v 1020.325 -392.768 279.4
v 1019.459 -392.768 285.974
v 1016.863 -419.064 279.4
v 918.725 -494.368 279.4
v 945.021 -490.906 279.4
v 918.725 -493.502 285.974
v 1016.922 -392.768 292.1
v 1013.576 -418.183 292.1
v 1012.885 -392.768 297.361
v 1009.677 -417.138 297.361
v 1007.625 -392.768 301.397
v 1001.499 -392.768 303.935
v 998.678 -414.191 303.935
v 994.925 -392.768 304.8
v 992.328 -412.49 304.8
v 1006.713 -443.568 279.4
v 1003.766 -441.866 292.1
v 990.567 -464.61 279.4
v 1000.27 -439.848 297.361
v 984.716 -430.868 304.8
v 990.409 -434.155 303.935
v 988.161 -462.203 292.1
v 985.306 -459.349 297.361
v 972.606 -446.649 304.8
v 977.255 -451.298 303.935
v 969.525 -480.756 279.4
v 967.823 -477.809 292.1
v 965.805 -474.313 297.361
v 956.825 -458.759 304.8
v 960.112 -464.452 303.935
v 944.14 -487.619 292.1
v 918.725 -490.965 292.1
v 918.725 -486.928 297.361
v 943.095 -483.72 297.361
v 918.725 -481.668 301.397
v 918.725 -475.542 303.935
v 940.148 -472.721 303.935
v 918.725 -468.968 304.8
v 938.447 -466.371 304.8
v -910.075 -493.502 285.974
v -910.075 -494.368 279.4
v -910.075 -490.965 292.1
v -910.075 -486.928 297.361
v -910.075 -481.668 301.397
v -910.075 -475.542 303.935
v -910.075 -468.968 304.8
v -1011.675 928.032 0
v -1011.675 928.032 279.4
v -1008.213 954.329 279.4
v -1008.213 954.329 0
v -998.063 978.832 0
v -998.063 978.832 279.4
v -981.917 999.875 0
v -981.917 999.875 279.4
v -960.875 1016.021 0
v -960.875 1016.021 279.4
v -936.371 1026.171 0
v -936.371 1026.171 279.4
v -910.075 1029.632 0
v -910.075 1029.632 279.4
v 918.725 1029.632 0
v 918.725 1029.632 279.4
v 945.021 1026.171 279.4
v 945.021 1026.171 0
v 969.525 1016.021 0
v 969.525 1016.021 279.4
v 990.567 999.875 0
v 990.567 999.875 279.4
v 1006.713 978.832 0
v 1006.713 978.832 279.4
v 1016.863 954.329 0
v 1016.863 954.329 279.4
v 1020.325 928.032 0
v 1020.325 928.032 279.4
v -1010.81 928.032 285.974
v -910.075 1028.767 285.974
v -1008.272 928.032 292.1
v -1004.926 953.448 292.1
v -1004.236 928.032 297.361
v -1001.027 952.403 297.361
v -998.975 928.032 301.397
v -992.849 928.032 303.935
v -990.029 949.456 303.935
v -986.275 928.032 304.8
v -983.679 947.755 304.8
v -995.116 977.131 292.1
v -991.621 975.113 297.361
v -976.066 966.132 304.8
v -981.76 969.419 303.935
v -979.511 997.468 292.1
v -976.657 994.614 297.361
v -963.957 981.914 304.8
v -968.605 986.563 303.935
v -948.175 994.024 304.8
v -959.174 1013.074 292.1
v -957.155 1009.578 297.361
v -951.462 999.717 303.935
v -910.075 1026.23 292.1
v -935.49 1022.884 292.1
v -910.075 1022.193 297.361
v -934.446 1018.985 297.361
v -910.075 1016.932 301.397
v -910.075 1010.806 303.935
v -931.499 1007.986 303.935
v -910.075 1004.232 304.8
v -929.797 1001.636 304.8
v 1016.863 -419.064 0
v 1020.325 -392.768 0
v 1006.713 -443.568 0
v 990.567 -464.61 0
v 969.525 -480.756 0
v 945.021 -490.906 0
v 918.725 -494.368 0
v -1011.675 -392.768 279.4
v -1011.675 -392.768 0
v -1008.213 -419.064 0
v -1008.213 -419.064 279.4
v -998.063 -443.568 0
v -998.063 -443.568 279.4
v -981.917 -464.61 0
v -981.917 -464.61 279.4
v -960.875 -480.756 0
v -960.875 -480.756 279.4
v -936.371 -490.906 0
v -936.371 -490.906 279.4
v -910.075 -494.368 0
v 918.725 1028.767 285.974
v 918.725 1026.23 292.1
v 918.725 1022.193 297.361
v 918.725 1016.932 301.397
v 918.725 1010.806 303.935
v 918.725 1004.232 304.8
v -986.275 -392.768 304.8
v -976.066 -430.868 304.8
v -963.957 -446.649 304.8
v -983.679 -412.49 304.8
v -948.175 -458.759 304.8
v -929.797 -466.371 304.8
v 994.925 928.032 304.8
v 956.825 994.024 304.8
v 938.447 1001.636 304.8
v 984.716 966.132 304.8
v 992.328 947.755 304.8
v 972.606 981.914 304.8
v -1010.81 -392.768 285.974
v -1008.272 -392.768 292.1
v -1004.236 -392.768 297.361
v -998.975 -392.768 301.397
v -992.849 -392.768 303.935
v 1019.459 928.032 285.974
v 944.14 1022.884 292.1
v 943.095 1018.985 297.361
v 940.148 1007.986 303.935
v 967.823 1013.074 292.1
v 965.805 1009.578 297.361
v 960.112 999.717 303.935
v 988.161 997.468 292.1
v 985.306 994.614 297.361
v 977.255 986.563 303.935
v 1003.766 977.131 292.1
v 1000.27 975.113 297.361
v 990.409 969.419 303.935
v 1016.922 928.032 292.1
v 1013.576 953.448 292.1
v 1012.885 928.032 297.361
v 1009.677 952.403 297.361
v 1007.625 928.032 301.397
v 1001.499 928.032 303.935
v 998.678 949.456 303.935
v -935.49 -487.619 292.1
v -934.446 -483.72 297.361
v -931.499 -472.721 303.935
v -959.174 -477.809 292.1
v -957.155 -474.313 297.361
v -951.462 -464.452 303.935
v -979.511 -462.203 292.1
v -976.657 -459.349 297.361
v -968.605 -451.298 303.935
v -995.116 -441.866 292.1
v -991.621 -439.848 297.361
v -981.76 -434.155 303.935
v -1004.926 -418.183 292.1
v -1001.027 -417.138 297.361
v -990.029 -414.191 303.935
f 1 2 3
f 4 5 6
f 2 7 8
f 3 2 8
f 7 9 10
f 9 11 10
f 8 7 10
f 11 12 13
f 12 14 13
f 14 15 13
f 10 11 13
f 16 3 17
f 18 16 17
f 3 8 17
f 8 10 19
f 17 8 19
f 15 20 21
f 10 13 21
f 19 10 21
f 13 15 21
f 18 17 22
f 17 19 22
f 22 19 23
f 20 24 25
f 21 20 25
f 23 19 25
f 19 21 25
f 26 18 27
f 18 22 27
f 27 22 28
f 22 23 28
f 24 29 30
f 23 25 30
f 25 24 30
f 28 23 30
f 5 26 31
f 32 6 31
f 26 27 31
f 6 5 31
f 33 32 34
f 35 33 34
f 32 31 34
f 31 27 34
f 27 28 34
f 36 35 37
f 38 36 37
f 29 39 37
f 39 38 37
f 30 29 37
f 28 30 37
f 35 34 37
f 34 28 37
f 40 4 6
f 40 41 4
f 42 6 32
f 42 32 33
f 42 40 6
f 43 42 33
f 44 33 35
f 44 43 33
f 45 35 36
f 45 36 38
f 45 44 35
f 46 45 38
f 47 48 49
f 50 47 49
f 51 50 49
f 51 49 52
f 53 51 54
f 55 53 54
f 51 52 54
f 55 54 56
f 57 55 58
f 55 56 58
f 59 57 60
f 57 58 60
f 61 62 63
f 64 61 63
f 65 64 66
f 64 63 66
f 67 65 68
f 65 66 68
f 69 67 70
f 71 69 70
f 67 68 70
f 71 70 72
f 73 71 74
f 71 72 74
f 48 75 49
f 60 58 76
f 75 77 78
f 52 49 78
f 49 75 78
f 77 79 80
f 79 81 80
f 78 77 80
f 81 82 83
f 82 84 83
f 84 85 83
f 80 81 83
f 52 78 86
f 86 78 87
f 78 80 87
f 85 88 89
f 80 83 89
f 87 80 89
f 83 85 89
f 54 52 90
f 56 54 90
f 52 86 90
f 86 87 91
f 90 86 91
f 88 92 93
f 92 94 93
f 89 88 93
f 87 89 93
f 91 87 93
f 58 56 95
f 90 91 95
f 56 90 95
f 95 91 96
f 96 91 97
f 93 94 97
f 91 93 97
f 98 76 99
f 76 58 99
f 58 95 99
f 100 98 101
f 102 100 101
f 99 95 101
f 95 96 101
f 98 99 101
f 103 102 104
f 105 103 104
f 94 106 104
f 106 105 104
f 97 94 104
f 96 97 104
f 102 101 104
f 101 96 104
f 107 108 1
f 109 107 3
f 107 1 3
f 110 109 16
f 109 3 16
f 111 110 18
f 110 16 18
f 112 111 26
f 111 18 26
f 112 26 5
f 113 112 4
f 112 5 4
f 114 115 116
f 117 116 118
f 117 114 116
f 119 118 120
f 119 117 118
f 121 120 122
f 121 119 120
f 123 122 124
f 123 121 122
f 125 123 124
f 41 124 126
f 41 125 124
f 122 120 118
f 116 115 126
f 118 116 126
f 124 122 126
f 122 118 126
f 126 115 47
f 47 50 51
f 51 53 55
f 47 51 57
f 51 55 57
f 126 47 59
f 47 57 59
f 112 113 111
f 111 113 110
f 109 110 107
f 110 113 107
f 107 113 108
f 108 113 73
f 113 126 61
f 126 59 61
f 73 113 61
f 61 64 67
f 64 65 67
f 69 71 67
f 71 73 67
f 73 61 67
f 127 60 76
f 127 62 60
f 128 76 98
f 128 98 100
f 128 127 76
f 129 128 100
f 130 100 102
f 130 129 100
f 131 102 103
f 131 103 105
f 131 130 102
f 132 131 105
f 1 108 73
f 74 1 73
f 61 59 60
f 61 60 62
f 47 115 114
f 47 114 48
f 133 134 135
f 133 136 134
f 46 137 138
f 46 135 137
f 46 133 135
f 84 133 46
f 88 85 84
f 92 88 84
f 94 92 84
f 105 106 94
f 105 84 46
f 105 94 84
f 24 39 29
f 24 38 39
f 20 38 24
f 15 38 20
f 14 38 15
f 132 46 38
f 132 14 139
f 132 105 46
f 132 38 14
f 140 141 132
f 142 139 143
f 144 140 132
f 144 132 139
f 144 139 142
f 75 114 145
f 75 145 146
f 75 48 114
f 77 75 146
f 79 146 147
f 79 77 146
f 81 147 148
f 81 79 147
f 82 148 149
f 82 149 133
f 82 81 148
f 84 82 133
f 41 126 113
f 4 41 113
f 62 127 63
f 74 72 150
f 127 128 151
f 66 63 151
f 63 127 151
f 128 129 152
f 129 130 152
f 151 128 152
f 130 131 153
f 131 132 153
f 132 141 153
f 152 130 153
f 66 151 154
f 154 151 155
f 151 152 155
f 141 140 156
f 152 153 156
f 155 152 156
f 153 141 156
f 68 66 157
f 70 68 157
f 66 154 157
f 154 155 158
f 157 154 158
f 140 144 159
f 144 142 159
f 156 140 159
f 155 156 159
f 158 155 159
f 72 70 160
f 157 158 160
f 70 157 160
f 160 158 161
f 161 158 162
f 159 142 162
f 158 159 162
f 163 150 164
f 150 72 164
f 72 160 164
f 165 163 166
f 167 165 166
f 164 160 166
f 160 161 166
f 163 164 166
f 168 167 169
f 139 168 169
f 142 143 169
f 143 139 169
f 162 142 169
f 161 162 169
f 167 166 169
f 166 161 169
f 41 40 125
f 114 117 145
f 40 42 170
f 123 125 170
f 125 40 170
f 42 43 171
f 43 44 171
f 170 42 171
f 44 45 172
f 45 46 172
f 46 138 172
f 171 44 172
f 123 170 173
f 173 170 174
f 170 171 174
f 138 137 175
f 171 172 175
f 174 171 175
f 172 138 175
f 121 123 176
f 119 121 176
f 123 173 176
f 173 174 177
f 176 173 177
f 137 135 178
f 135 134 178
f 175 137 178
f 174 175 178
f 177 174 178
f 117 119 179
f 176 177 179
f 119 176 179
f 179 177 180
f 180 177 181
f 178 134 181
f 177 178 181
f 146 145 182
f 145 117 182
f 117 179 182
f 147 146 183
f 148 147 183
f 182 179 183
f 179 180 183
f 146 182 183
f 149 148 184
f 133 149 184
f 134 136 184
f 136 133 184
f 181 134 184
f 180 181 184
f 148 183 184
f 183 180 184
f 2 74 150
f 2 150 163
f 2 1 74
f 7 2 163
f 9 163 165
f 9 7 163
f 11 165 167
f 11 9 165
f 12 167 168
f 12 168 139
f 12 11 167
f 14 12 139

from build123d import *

# Parameters (mm, degrees)
F0_W     = 2032
F0_H     = 1524
F1_DEPTH = 304.8
F2_R     = 101.6
F3_R     = 101.6
F4_R     = 101.6
F5_R     = 101.6
F6_R     = 25.4


with BuildPart() as f1:
    # F0 (on Top) → F1 (new body)
    with BuildSketch(Plane.XY):
        with Locations((4.324865, 267.63249)):
            Rectangle(F0_W, F0_H)
    extrude(amount=F1_DEPTH)

    # F2
    f2_edges = [f1.edges().sort_by_distance(p)[0] for p in [
        (-1011.675135, -494.36751, 152.4),
    ]]
    fillet(f2_edges, radius=F2_R)

    # F3
    f3_edges = [f1.edges().sort_by_distance(p)[0] for p in [
        (-1011.675135, 1029.63249, 152.4),
    ]]
    fillet(f3_edges, radius=F3_R)

    # F4
    f4_edges = [f1.edges().sort_by_distance(p)[0] for p in [
        (1020.324865, 1029.63249, 152.4),
    ]]
    fillet(f4_edges, radius=F4_R)

    # F5
    f5_edges = [f1.edges().sort_by_distance(p)[0] for p in [
        (1020.324865, -494.36751, 152.4),
    ]]
    fillet(f5_edges, radius=F5_R)

    # F6
    f6_edges = [f1.edges().sort_by_distance(p)[0] for p in [
        (-1011.675135, 267.63249, 304.8),
        (4.324865, 1029.63249, 304.8),
        (4.324865, -494.36751, 304.8),
        (1020.324865, 267.63249, 304.8),
    ]]
    fillet(f6_edges, radius=F6_R)


solid = f1.part
